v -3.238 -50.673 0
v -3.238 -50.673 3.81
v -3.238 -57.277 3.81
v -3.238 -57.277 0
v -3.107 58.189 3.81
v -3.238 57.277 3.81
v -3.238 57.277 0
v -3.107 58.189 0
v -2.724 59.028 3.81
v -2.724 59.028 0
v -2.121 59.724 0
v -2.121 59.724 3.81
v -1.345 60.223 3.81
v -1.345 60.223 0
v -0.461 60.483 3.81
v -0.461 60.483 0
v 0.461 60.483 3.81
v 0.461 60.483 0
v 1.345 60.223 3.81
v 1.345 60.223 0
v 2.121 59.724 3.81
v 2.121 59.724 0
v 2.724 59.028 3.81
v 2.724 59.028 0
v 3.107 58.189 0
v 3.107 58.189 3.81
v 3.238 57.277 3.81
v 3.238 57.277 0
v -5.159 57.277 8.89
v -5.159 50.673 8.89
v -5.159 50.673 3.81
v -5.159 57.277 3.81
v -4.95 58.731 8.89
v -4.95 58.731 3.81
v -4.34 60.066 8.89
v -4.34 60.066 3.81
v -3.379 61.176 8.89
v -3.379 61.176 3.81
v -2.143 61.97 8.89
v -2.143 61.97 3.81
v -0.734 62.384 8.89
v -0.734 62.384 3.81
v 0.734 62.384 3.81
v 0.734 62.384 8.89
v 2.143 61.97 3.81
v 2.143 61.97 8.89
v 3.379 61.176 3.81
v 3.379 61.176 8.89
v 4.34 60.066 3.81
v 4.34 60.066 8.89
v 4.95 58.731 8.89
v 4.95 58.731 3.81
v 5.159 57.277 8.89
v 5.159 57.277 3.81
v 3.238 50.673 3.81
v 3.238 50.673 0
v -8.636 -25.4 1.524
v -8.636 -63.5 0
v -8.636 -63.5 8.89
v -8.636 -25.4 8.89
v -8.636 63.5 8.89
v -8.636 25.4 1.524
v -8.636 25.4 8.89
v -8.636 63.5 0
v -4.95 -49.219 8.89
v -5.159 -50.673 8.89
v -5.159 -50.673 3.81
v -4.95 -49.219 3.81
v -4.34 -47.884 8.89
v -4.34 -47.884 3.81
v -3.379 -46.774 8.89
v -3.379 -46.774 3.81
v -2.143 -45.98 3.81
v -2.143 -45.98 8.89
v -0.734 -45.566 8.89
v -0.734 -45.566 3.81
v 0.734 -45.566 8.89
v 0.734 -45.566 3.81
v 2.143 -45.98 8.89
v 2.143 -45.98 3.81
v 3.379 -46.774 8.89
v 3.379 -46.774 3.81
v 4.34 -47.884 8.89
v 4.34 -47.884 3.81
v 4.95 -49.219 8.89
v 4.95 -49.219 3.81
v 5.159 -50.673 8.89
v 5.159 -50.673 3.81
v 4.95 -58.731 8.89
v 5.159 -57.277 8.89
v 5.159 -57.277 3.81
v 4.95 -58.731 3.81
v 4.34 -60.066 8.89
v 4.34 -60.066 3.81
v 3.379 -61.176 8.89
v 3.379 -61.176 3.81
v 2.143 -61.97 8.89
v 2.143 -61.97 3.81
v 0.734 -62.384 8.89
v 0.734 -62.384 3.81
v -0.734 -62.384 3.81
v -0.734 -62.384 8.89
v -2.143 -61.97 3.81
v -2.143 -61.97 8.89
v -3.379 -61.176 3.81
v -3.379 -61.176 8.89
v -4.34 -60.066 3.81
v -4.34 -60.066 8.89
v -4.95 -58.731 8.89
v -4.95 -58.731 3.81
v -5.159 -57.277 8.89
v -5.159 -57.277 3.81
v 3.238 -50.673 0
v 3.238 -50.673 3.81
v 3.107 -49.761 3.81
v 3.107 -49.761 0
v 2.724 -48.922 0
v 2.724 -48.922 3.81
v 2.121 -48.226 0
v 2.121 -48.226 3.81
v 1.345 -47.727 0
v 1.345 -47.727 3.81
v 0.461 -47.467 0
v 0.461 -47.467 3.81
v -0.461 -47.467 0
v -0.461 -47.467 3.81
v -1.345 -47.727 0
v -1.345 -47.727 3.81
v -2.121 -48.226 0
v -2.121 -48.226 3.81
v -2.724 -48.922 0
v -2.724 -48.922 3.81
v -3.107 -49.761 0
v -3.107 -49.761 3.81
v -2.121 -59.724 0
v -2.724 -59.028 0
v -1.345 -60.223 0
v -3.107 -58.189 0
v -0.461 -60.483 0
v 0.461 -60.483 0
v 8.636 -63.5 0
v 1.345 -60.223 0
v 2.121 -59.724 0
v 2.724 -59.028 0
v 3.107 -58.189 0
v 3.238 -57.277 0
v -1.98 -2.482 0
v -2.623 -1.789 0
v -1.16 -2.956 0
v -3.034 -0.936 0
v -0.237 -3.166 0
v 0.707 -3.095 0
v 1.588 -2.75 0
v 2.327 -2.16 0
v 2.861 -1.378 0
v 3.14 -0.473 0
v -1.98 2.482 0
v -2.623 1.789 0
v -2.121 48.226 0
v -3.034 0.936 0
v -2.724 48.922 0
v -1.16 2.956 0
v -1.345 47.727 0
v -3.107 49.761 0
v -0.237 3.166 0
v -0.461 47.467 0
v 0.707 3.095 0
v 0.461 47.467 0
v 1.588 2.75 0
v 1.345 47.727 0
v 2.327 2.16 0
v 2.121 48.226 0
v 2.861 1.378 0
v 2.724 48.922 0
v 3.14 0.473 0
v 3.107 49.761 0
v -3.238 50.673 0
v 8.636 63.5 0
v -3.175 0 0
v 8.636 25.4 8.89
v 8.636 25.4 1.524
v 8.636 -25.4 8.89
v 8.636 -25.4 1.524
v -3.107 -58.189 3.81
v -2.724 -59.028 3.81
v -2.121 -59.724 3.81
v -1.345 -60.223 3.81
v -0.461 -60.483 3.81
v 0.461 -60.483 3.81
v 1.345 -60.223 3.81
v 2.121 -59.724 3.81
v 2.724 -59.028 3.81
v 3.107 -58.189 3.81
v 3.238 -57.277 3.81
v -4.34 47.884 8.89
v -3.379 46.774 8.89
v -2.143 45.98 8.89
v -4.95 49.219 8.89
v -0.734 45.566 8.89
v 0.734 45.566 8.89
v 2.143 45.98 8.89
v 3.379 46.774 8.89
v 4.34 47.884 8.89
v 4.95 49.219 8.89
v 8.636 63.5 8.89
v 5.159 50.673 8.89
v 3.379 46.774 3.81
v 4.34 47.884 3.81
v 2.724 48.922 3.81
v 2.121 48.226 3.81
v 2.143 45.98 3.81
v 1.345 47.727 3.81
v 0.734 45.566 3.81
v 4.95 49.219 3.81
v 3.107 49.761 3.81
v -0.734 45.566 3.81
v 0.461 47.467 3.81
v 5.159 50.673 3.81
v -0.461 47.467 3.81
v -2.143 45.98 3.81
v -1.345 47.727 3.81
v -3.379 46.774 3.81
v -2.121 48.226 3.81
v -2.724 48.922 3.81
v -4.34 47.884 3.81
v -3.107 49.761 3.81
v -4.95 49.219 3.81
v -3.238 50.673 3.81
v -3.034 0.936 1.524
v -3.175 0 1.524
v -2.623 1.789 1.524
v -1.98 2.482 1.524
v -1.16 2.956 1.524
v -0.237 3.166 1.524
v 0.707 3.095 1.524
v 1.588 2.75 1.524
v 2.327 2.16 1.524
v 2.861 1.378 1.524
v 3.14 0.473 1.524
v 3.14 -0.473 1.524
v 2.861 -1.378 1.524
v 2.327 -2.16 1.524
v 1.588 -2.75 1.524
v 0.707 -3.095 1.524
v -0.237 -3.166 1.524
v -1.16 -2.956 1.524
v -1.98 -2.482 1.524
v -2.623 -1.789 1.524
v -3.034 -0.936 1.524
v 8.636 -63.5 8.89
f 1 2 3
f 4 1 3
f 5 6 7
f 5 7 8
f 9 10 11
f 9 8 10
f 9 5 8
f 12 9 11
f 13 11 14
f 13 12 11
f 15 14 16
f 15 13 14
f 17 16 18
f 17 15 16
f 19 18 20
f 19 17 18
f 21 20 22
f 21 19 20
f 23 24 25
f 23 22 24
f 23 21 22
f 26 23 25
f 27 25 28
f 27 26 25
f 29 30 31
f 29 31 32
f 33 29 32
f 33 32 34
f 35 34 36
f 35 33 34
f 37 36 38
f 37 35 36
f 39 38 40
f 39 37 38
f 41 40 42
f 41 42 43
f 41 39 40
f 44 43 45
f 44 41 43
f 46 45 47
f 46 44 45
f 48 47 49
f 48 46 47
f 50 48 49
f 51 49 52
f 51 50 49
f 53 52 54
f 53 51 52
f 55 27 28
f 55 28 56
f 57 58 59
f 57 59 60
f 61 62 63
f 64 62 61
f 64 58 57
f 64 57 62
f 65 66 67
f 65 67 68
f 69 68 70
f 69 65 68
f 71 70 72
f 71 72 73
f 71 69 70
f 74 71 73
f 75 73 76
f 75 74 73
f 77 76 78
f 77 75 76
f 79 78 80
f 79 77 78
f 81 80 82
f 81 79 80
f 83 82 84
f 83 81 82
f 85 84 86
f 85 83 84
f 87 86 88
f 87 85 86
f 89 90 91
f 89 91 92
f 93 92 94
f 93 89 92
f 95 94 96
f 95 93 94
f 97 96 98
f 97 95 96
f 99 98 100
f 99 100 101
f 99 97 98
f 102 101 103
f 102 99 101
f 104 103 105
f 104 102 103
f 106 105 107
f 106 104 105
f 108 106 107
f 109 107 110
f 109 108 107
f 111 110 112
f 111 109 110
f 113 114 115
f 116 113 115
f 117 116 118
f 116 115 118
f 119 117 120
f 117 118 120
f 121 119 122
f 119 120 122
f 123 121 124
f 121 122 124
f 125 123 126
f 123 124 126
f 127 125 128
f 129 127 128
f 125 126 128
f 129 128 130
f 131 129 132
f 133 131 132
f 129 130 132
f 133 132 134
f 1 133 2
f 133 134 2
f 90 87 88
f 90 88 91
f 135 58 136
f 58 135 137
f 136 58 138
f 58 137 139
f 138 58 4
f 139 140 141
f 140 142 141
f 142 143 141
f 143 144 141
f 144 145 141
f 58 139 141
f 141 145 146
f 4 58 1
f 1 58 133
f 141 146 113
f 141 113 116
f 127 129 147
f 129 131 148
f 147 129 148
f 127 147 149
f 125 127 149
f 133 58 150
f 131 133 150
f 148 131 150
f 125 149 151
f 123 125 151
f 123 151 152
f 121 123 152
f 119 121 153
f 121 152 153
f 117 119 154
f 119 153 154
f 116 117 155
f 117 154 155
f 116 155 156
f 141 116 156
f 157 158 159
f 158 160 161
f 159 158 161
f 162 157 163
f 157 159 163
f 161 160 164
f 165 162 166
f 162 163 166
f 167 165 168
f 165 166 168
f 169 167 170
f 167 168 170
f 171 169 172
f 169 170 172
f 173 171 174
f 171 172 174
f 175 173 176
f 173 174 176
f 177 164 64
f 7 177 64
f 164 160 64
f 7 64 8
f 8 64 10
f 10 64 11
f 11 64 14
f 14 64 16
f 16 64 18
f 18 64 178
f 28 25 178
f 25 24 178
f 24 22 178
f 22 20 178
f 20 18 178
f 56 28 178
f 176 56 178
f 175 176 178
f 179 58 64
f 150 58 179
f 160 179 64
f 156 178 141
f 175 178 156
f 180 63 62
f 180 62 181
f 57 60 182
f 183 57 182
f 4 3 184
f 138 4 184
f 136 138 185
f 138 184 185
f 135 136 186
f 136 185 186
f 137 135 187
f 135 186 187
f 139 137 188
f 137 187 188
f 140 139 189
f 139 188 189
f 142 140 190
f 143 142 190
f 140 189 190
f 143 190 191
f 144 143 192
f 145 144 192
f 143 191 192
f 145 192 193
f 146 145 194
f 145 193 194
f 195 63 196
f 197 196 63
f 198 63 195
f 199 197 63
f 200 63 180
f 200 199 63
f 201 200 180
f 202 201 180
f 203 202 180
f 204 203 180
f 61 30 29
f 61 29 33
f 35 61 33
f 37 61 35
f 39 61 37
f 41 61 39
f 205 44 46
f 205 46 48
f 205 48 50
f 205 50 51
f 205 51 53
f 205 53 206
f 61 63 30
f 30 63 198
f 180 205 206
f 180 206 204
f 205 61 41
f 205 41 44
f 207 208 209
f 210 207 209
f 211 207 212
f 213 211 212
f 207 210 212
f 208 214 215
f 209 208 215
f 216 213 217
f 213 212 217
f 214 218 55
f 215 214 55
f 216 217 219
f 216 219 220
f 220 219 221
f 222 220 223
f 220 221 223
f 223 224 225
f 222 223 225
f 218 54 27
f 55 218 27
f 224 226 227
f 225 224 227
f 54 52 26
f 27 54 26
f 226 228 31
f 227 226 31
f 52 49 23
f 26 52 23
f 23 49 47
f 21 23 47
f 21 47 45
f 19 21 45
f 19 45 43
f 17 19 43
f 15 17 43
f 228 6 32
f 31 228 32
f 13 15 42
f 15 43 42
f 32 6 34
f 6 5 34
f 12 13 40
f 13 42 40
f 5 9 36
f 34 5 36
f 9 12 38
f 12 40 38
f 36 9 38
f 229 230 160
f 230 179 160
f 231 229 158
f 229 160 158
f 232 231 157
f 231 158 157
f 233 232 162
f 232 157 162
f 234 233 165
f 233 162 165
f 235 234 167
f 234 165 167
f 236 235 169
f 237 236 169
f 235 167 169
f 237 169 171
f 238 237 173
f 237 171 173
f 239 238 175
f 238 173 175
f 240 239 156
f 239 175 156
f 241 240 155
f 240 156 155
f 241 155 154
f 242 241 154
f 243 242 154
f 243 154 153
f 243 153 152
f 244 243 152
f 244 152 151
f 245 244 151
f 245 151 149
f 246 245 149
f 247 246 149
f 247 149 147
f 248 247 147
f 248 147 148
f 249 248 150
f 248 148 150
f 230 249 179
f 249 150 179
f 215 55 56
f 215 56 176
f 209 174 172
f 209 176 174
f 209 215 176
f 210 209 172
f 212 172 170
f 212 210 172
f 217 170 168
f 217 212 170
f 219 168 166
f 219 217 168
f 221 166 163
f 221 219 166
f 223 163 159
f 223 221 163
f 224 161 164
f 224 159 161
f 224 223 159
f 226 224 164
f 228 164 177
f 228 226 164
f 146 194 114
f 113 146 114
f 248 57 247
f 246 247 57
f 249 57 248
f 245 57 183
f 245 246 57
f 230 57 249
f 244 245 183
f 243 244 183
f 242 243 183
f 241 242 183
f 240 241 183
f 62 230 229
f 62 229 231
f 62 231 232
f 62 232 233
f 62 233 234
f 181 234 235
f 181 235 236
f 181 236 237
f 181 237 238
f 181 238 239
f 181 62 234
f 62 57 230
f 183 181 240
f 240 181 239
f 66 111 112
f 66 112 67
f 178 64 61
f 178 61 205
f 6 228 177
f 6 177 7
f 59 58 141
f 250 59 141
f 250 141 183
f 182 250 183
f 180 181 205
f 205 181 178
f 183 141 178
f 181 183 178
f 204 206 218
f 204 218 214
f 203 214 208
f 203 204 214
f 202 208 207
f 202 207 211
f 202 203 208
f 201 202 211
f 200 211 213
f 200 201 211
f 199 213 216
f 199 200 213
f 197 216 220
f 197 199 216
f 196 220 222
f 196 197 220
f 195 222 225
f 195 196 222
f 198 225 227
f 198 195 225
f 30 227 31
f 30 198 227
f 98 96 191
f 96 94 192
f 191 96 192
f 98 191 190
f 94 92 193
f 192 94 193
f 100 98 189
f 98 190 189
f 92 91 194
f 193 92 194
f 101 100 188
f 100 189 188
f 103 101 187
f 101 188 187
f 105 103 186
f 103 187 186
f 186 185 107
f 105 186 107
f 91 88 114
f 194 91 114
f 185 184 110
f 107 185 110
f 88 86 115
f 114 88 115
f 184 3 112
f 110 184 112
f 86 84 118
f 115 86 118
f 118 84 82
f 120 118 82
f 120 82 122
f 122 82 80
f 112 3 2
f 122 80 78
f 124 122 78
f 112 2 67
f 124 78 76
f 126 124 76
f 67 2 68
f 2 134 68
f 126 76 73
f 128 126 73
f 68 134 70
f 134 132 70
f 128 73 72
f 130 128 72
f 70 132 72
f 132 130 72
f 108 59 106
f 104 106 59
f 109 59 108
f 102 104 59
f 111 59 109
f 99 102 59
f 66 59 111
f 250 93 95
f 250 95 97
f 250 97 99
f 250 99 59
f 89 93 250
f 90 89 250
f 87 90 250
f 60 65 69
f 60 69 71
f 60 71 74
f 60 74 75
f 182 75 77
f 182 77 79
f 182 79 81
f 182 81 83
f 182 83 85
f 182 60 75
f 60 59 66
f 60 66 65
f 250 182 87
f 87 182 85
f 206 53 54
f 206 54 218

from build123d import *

# Parameters (mm, degrees)
SKETCH1_W                       = 17.272
SKETCH1_H                       = 127
BOSS_EXTRUDE1_DEPTH             = 8.89
F_1_4_0_25_DIAMETER_HOLE1_D     = 6.35
F_1_4_0_25_DIAMETER_HOLE1_DEPTH = 8.89
SKETCH5_W                       = 17.272
SKETCH5_H                       = 50.8
CUT_EXTRUDE1_DEPTH              = 7.366
CUT_EXTRUDE2_DEPTH              = 9.89
CUT_EXTRUDE3_DEPTH              = 5.08


with BuildPart() as part:
    # Sketch1 → Boss-Extrude1 (new body)
    with BuildSketch(Plane.XY):
        Rectangle(SKETCH1_W, SKETCH1_H)
    extrude(amount=BOSS_EXTRUDE1_DEPTH)

    # 1/4 (0.25) Diameter Hole1
    with Locations(Plane.XY.offset(8.89)):
        with Locations((0, 0)):
            Hole(F_1_4_0_25_DIAMETER_HOLE1_D / 2, depth=F_1_4_0_25_DIAMETER_HOLE1_DEPTH)

    # Sketch5 → Cut-Extrude1 (cut)
    with BuildSketch(Plane.XY.offset(8.89)):
        Rectangle(SKETCH5_W, SKETCH5_H)
    extrude(amount=-CUT_EXTRUDE1_DEPTH, mode=Mode.SUBTRACT)

    # Sketch13 → Cut-Extrude2 (cut, through all)
    with BuildSketch(Plane.XY.offset(8.89)):
        with BuildLine():
            Line((3.2385, 57.277), (3.2385, 50.673))
            ThreePointArc((3.2385, 50.673), (0, 47.4345), (-3.2385, 50.673))
            Line((-3.2385, 50.673), (-3.2385, 57.277))
            ThreePointArc((-3.2385, 57.277), (0, 60.5155), (3.2385, 57.277))
        make_face()
        with BuildLine():
            Line((3.2385, -57.277), (3.2385, -50.673))
            ThreePointArc((3.2385, -50.673), (0, -47.4345), (-3.2385, -50.673))
            Line((-3.2385, -50.673), (-3.2385, -57.277))
            ThreePointArc((-3.2385, -57.277), (0, -60.5155), (3.2385, -57.277))
        make_face()
    extrude(amount=-CUT_EXTRUDE2_DEPTH, mode=Mode.SUBTRACT)

    # Sketch14 → Cut-Extrude3 (cut)
    with BuildSketch(Plane.XY.offset(8.89)):
        with BuildLine():
            Line((-5.159375, 50.673), (-5.159375, 57.277))
            ThreePointArc((-5.159375, 57.277), (0, 62.436375), (5.159375, 57.277))
            Line((5.159375, 57.277), (5.159375, 50.673))
            ThreePointArc((5.159375, 50.673), (0, 45.513625), (-5.159375, 50.673))
        make_face()
        with BuildLine():
            Line((5.159375, -50.673), (5.159375, -57.277))
            ThreePointArc((5.159375, -57.277), (0, -62.436375), (-5.159375, -57.277))
            Line((-5.159375, -57.277), (-5.159375, -50.673))
            ThreePointArc((-5.159375, -50.673), (0, -45.513625), (5.159375, -50.673))
        make_face()
    extrude(amount=-CUT_EXTRUDE3_DEPTH, mode=Mode.SUBTRACT)


solid = part.part
